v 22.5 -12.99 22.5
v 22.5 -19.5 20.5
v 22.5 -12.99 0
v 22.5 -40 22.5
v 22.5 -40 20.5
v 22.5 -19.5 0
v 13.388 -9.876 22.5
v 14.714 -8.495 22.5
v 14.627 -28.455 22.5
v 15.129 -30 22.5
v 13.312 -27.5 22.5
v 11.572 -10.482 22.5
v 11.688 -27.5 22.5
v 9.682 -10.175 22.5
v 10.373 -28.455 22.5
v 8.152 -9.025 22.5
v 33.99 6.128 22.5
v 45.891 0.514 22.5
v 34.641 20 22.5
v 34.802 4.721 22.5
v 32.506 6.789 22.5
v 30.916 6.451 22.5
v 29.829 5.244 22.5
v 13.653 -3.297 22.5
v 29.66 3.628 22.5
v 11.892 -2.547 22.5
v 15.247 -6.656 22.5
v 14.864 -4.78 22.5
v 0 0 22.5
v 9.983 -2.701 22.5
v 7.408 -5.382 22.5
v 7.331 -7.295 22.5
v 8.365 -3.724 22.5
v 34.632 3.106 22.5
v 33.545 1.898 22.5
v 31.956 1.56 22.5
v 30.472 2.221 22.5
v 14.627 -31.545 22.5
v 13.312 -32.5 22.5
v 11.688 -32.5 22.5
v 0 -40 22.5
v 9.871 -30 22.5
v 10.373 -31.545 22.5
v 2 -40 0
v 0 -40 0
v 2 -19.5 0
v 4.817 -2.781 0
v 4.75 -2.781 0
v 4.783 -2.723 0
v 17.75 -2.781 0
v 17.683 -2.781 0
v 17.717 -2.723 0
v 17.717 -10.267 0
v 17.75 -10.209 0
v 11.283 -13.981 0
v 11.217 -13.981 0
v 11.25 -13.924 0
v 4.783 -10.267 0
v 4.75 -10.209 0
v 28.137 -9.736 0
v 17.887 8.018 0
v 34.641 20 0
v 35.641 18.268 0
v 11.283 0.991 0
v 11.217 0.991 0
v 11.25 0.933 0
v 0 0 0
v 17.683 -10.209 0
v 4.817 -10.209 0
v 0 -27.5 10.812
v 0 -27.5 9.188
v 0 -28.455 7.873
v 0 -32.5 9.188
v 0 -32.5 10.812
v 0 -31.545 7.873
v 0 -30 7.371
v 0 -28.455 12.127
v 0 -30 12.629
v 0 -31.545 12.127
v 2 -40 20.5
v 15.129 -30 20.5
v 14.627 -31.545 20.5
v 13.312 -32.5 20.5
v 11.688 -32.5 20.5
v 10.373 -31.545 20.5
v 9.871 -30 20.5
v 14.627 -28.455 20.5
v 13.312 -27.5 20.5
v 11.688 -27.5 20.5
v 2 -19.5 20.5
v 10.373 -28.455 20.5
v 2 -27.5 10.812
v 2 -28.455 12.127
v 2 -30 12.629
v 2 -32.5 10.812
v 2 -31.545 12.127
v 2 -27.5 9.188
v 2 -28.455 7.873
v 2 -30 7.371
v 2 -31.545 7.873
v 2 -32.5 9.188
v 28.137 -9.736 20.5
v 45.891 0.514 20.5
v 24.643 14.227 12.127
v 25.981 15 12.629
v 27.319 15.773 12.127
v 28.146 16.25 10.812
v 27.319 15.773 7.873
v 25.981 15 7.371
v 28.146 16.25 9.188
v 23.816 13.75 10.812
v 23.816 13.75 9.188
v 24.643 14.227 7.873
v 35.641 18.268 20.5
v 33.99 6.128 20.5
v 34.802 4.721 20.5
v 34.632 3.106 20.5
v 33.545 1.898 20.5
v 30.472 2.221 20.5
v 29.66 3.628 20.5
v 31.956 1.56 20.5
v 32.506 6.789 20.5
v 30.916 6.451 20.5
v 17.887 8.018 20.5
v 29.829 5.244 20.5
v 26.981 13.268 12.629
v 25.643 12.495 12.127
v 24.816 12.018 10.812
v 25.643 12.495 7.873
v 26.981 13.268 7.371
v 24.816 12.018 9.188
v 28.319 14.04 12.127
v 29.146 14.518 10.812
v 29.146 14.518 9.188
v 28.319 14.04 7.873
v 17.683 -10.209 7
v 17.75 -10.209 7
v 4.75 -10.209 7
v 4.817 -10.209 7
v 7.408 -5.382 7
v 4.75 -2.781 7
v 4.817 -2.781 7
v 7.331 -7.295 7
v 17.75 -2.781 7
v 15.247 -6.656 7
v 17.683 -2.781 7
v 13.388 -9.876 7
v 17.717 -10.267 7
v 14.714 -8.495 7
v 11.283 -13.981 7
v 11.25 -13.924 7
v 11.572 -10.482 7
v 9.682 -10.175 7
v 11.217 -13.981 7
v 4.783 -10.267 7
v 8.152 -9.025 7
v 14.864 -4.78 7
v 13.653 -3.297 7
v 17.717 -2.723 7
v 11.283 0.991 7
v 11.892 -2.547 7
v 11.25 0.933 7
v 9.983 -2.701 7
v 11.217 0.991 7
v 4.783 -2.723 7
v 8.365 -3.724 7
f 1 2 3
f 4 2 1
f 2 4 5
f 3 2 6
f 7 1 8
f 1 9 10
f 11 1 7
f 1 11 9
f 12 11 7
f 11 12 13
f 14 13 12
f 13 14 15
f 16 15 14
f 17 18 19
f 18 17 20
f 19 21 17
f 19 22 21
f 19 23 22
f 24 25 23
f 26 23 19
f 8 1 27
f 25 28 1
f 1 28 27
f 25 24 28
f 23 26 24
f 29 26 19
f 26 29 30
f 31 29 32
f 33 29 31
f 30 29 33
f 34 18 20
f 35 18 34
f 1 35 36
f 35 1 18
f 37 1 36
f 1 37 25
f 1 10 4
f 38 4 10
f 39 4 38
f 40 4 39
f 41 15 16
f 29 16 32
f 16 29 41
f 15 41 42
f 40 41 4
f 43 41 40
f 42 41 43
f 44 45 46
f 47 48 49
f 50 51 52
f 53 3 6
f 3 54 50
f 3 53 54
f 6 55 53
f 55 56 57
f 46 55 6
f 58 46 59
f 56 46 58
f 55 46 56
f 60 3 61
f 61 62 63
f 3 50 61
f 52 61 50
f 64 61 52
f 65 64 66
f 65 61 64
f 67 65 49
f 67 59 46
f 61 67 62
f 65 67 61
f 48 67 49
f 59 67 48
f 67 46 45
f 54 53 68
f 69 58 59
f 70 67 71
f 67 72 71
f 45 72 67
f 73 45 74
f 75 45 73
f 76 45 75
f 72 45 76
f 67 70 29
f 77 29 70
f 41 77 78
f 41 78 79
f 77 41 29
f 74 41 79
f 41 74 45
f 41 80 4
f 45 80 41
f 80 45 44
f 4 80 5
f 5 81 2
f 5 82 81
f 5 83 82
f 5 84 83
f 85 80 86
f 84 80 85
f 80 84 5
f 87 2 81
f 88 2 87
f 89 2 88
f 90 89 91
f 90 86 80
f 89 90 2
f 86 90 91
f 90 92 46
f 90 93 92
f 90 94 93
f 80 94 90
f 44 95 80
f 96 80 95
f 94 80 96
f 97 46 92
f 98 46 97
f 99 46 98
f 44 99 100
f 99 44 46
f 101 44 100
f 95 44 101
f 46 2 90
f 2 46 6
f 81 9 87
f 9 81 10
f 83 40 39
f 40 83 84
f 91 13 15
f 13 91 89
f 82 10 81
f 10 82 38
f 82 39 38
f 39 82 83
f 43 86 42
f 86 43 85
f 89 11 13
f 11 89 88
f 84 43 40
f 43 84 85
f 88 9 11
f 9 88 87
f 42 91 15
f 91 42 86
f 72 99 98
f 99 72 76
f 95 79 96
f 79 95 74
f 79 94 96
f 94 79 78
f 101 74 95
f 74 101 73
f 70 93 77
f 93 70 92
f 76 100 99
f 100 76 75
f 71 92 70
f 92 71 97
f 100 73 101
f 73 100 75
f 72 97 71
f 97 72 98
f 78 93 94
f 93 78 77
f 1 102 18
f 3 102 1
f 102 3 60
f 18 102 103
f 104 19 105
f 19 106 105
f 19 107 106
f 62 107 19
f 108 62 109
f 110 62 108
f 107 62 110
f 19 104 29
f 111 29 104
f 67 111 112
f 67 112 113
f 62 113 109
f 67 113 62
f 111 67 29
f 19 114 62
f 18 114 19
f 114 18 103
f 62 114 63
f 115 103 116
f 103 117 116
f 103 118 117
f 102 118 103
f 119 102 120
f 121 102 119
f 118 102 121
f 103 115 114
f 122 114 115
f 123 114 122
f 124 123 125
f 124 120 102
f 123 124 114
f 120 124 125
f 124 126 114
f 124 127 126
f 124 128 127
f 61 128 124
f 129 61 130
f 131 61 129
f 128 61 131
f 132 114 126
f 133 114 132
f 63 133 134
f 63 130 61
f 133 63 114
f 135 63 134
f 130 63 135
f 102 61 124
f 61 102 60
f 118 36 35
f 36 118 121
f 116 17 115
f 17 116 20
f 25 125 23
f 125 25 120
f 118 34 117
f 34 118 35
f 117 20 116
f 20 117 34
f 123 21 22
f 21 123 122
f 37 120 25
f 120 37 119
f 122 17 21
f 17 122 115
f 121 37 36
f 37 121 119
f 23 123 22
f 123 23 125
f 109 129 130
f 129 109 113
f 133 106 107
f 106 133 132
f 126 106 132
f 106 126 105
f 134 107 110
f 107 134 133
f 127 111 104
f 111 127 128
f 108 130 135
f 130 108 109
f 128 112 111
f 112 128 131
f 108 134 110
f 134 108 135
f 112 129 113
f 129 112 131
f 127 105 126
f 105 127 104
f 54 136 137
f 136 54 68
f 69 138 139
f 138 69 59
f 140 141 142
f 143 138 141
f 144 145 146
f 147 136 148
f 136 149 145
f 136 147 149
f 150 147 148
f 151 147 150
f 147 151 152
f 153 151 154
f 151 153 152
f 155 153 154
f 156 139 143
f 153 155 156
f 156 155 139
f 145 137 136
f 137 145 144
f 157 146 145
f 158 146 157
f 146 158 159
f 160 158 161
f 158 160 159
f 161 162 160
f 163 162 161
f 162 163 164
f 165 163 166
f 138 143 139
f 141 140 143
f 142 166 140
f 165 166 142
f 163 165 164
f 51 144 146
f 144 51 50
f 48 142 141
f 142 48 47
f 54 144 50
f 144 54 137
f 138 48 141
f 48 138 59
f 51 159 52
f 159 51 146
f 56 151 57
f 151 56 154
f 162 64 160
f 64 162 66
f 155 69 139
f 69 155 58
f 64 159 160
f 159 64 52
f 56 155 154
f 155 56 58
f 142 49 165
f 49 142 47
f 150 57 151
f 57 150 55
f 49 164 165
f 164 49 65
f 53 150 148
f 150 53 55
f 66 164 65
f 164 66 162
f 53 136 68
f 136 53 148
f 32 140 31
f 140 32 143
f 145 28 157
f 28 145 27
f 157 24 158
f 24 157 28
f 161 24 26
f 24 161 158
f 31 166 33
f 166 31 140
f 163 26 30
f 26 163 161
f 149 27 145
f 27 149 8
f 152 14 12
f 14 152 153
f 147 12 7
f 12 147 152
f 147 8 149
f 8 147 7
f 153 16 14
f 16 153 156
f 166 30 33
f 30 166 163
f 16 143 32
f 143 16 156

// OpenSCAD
include <MCAD/polyholes.scad>
use <MCAD/shapes.scad>

clearance = 0.5;
wall_thickness = 2;
extrusion_size = 20;
hole_size = 5;
angle = 60; // 60 degrees for hex connector

foot_hole_size = 8;
foot_hole_nut_width = 13; // across flats
foot_hole_nut_height = 7;

size = extrusion_size + clearance + wall_thickness;

module hex_connector(foot_hole = false) {
	difference() {
		union() {
			translate([0,-extrusion_size*2,0]) {
				connector();
			}		

			rotate(-angle) translate([0,extrusion_size*2,0]) {
				mirror([0,1,0]) connector();
			}
		}
		if(foot_hole) {
			rotate([0,0,-angle/2]) 
			  translate([(size/2)/cos(angle/2),0,size/2]) 
			    cylinder(size, foot_hole_size/2, foot_hole_size/2, true);
			rotate(-angle/2)		
		    	  translate([(size/2)/cos(angle/2), 0, foot_hole_nut_height/2])
			    hexagon(foot_hole_nut_width, foot_hole_nut_height);
		}
	}
}

module connector() {
	difference() {
		cube([size,extrusion_size*2,size]);
		translate([wall_thickness,0,0]) cube(extrusion_size + clearance);	
		translate([extrusion_size/2 + wall_thickness + clearance, extrusion_size/2, extrusion_size]) polyhole(wall_thickness + 2*clearance, hole_size);
		translate([0 - clearance, extrusion_size/2, extrusion_size/2]) rotate([0,90,0]) polyhole(wall_thickness + 2*clearance, hole_size);
	}
}



hex_connector(true);
